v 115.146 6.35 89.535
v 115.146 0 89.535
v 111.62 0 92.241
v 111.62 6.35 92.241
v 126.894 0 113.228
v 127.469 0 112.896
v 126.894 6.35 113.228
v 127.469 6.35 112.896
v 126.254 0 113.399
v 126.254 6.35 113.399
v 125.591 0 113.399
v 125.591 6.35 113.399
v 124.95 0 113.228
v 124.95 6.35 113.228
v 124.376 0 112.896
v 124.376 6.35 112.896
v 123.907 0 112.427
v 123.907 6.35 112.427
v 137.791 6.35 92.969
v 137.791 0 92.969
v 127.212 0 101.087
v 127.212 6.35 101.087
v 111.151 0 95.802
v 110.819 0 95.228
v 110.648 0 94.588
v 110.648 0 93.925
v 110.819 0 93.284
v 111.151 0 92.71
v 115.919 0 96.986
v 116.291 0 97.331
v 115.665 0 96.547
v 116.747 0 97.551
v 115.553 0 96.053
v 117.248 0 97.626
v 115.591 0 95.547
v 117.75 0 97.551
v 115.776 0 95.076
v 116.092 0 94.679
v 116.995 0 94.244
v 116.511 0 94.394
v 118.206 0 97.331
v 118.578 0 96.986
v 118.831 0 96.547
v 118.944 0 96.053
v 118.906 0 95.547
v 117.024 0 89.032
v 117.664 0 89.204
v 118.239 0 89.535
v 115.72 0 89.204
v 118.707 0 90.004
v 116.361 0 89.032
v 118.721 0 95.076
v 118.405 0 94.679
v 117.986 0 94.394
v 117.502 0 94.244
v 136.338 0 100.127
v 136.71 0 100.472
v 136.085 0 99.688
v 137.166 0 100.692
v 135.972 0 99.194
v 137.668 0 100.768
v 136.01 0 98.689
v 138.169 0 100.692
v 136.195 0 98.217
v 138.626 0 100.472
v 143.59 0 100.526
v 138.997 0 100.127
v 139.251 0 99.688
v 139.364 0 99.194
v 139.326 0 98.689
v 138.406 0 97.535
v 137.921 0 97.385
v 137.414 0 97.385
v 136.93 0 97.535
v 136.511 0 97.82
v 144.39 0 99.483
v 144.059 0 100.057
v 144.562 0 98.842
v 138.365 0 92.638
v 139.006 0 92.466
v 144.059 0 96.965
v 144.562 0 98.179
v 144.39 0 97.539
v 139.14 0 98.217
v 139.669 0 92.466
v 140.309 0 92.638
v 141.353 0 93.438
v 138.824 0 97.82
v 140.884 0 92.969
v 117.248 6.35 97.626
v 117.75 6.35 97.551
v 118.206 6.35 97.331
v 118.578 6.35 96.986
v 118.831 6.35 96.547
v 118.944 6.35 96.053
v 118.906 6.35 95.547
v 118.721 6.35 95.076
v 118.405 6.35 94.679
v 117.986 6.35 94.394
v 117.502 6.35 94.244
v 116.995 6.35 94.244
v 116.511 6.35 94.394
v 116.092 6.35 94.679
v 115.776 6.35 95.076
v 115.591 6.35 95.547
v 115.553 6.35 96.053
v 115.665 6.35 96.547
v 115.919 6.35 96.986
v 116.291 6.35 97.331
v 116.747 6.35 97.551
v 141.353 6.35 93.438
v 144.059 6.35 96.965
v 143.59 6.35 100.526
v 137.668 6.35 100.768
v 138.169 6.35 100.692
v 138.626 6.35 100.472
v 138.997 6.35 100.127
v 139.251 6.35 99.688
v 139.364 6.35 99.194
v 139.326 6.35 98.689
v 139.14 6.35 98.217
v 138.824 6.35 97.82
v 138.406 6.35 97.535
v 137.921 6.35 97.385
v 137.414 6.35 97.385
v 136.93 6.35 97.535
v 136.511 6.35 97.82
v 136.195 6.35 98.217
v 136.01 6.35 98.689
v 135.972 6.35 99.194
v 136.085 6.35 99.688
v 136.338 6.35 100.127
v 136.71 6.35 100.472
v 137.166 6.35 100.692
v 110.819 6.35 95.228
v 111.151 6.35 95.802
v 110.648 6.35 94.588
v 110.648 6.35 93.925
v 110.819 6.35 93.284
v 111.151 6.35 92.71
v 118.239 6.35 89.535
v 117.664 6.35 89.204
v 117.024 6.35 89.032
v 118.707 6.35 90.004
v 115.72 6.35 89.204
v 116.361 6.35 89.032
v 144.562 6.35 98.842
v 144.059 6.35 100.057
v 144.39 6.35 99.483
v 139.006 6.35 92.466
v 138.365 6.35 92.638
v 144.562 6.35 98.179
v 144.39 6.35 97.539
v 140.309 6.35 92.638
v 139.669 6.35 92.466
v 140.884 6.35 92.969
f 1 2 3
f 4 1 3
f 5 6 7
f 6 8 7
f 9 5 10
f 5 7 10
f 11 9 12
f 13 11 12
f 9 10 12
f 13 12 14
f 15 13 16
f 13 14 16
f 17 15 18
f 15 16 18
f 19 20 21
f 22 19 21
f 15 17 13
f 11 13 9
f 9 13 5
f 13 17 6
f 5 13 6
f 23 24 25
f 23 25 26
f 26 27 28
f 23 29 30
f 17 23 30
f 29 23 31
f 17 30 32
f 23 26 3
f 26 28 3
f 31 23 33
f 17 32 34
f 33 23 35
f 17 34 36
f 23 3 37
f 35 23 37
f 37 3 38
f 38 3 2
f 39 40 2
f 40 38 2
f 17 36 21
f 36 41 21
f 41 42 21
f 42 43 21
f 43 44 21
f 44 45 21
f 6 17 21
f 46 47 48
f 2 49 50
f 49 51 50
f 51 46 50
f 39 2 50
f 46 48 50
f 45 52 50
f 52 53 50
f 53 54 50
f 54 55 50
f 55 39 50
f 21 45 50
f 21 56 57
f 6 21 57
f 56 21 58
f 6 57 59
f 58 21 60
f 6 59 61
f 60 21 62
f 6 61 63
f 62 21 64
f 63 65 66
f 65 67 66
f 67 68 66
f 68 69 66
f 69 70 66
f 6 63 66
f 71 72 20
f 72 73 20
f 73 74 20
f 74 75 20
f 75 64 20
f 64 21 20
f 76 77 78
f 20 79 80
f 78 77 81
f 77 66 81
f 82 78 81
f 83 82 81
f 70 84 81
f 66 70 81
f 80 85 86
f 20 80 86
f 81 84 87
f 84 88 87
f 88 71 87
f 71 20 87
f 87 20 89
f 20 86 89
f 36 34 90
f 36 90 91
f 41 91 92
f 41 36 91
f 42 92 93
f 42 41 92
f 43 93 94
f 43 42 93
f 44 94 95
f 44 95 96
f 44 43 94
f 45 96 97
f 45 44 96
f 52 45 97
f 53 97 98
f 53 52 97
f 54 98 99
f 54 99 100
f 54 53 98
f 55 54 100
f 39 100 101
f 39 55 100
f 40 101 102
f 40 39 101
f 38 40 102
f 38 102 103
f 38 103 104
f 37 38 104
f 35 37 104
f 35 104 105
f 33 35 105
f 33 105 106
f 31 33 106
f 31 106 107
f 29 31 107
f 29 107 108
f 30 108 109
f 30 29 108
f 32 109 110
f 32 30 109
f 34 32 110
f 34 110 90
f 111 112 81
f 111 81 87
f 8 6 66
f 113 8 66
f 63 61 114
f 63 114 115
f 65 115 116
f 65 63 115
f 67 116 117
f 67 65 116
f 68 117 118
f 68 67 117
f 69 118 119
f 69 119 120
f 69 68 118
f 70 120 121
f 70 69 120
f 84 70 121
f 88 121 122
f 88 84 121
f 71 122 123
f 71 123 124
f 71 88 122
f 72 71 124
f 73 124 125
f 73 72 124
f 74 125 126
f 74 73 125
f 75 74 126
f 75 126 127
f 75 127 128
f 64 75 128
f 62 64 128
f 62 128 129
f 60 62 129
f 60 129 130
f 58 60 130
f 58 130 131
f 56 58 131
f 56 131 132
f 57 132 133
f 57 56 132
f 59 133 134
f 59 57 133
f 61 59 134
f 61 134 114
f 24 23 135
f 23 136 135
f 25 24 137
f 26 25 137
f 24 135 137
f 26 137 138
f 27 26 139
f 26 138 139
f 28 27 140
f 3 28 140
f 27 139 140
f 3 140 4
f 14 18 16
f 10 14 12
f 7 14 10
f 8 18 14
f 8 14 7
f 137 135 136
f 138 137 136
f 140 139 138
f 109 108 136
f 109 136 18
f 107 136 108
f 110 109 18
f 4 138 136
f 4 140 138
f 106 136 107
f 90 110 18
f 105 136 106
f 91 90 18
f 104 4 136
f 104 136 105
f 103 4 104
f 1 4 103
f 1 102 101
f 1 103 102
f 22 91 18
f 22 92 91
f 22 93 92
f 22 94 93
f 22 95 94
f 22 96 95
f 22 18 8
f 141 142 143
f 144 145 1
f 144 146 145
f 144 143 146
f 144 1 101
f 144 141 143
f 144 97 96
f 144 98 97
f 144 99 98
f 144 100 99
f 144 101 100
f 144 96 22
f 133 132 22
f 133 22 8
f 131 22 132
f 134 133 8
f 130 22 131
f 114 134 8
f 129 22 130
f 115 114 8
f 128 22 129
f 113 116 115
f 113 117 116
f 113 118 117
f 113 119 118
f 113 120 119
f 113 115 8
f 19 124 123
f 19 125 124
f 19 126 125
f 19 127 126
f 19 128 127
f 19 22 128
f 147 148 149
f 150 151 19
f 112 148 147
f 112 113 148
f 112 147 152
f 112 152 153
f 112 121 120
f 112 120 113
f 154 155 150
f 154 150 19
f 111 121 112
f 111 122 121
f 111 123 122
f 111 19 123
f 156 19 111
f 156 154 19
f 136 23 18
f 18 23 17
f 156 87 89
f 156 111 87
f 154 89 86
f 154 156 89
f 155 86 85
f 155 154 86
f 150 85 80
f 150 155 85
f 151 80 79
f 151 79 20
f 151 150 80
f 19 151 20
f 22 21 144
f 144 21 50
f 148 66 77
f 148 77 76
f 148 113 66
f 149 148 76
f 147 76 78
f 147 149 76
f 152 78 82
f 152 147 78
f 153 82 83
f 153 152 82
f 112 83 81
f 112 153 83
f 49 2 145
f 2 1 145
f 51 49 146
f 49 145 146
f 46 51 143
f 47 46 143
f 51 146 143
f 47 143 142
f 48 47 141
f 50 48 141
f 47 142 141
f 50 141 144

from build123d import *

# Parameters (mm, degrees)
SKETCH1_R           = 1.70053
BOSS_EXTRUDE1_DEPTH = 6.35
FILLET1_R           = 2.54


with BuildPart() as part:
    # Sketch1 → Boss-Extrude1 (new body)
    with BuildSketch(Plane(origin=(0, 0, 0), x_dir=(1, 0, 0), z_dir=(0, 1, 0))):
        Polygon((125.453583476, -114.442232973), (145.604758319, -98.979692676), (139.806305708, -91.42300211), (127.211821431, -101.087089795), (117.161170238, -87.988826147), (109.604479672, -93.787278758), align=None)
        with Locations(Location((117.248460029, -95.925846163, 0), (0, 0, 270))):
            Circle(SKETCH1_R, mode=Mode.SUBTRACT)
        with Locations(Location((137.667738303, -99.066982467, 0), (0, 0, 270))):
            Circle(SKETCH1_R, mode=Mode.SUBTRACT)
    extrude(amount=BOSS_EXTRUDE1_DEPTH)

    # Fillet1
    fillet1_edges = [part.edges().sort_by_distance(p)[0] for p in [
        (139.806305708, 3.175, 91.42300211),
        (145.604758319, 3.175, 98.979692676),
        (125.453583476, 3.175, 114.442232973),
        (109.604479672, 3.175, 93.787278758),
        (117.161170238, 3.175, 87.988826147),
    ]]
    fillet(fillet1_edges, radius=FILLET1_R)


solid = part.part
